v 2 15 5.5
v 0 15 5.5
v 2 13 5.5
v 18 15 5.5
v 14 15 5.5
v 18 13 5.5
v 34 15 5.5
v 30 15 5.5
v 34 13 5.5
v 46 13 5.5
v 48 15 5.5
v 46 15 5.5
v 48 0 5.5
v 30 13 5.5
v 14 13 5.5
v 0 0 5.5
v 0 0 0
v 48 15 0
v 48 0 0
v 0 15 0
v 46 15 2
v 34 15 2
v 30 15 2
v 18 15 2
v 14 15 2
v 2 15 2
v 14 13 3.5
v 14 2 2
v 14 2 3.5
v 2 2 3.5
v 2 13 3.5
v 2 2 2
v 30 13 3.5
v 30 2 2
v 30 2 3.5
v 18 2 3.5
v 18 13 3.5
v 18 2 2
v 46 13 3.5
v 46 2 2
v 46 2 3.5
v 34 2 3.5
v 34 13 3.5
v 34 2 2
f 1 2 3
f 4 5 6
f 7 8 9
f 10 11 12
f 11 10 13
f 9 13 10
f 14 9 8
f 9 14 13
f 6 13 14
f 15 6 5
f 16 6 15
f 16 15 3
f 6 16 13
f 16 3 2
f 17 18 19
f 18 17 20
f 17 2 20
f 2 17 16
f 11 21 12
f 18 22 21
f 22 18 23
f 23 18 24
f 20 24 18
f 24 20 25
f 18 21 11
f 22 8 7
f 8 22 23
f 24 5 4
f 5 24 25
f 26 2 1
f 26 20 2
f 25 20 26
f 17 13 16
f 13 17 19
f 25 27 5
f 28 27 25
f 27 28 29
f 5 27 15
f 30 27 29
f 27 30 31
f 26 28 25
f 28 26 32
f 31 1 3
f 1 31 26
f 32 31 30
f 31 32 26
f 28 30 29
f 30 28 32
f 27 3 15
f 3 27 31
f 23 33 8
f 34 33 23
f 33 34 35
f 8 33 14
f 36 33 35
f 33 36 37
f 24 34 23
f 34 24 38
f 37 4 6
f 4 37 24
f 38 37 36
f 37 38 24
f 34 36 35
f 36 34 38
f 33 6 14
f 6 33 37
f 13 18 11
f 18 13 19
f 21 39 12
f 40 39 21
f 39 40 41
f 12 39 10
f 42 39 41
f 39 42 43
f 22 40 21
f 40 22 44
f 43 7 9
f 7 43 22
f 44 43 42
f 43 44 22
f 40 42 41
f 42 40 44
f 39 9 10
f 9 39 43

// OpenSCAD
MicroSD(12,15,1.5,2);

module MicroSD(CardW,CardL,CardH,Wall)
{
	HolderW = CardW + (Wall*2);
	HolderH = CardH + (Wall*2);
	CutoutH = 5;
	CutoutL = 3;
	translate([HolderW*0,0,0])difference()
	{
		cube([HolderW,CardL,HolderH]);
		translate([Wall,Wall,Wall]) cube([CardW,CardL,CardH]);
		translate([Wall,CardL-Wall,Wall]) cube([CardW,CutoutL,CutoutH]);
	}
	translate([HolderW*1,0,0]) difference()
	{
		cube([HolderW,CardL,HolderH]);
		translate([Wall,Wall,Wall]) cube([CardW,CardL,CardH]);
		translate([Wall,CardL-Wall,Wall]) cube([CardW,CutoutL,CutoutH]);
	}
	translate([HolderW*2,0,0]) difference()
	{
		cube([HolderW,CardL,HolderH]);
		translate([Wall,Wall,Wall]) cube([CardW,CardL,CardH]);
		translate([Wall,CardL-Wall,Wall]) cube([CardW,CutoutL,CutoutH]);
	}
}
